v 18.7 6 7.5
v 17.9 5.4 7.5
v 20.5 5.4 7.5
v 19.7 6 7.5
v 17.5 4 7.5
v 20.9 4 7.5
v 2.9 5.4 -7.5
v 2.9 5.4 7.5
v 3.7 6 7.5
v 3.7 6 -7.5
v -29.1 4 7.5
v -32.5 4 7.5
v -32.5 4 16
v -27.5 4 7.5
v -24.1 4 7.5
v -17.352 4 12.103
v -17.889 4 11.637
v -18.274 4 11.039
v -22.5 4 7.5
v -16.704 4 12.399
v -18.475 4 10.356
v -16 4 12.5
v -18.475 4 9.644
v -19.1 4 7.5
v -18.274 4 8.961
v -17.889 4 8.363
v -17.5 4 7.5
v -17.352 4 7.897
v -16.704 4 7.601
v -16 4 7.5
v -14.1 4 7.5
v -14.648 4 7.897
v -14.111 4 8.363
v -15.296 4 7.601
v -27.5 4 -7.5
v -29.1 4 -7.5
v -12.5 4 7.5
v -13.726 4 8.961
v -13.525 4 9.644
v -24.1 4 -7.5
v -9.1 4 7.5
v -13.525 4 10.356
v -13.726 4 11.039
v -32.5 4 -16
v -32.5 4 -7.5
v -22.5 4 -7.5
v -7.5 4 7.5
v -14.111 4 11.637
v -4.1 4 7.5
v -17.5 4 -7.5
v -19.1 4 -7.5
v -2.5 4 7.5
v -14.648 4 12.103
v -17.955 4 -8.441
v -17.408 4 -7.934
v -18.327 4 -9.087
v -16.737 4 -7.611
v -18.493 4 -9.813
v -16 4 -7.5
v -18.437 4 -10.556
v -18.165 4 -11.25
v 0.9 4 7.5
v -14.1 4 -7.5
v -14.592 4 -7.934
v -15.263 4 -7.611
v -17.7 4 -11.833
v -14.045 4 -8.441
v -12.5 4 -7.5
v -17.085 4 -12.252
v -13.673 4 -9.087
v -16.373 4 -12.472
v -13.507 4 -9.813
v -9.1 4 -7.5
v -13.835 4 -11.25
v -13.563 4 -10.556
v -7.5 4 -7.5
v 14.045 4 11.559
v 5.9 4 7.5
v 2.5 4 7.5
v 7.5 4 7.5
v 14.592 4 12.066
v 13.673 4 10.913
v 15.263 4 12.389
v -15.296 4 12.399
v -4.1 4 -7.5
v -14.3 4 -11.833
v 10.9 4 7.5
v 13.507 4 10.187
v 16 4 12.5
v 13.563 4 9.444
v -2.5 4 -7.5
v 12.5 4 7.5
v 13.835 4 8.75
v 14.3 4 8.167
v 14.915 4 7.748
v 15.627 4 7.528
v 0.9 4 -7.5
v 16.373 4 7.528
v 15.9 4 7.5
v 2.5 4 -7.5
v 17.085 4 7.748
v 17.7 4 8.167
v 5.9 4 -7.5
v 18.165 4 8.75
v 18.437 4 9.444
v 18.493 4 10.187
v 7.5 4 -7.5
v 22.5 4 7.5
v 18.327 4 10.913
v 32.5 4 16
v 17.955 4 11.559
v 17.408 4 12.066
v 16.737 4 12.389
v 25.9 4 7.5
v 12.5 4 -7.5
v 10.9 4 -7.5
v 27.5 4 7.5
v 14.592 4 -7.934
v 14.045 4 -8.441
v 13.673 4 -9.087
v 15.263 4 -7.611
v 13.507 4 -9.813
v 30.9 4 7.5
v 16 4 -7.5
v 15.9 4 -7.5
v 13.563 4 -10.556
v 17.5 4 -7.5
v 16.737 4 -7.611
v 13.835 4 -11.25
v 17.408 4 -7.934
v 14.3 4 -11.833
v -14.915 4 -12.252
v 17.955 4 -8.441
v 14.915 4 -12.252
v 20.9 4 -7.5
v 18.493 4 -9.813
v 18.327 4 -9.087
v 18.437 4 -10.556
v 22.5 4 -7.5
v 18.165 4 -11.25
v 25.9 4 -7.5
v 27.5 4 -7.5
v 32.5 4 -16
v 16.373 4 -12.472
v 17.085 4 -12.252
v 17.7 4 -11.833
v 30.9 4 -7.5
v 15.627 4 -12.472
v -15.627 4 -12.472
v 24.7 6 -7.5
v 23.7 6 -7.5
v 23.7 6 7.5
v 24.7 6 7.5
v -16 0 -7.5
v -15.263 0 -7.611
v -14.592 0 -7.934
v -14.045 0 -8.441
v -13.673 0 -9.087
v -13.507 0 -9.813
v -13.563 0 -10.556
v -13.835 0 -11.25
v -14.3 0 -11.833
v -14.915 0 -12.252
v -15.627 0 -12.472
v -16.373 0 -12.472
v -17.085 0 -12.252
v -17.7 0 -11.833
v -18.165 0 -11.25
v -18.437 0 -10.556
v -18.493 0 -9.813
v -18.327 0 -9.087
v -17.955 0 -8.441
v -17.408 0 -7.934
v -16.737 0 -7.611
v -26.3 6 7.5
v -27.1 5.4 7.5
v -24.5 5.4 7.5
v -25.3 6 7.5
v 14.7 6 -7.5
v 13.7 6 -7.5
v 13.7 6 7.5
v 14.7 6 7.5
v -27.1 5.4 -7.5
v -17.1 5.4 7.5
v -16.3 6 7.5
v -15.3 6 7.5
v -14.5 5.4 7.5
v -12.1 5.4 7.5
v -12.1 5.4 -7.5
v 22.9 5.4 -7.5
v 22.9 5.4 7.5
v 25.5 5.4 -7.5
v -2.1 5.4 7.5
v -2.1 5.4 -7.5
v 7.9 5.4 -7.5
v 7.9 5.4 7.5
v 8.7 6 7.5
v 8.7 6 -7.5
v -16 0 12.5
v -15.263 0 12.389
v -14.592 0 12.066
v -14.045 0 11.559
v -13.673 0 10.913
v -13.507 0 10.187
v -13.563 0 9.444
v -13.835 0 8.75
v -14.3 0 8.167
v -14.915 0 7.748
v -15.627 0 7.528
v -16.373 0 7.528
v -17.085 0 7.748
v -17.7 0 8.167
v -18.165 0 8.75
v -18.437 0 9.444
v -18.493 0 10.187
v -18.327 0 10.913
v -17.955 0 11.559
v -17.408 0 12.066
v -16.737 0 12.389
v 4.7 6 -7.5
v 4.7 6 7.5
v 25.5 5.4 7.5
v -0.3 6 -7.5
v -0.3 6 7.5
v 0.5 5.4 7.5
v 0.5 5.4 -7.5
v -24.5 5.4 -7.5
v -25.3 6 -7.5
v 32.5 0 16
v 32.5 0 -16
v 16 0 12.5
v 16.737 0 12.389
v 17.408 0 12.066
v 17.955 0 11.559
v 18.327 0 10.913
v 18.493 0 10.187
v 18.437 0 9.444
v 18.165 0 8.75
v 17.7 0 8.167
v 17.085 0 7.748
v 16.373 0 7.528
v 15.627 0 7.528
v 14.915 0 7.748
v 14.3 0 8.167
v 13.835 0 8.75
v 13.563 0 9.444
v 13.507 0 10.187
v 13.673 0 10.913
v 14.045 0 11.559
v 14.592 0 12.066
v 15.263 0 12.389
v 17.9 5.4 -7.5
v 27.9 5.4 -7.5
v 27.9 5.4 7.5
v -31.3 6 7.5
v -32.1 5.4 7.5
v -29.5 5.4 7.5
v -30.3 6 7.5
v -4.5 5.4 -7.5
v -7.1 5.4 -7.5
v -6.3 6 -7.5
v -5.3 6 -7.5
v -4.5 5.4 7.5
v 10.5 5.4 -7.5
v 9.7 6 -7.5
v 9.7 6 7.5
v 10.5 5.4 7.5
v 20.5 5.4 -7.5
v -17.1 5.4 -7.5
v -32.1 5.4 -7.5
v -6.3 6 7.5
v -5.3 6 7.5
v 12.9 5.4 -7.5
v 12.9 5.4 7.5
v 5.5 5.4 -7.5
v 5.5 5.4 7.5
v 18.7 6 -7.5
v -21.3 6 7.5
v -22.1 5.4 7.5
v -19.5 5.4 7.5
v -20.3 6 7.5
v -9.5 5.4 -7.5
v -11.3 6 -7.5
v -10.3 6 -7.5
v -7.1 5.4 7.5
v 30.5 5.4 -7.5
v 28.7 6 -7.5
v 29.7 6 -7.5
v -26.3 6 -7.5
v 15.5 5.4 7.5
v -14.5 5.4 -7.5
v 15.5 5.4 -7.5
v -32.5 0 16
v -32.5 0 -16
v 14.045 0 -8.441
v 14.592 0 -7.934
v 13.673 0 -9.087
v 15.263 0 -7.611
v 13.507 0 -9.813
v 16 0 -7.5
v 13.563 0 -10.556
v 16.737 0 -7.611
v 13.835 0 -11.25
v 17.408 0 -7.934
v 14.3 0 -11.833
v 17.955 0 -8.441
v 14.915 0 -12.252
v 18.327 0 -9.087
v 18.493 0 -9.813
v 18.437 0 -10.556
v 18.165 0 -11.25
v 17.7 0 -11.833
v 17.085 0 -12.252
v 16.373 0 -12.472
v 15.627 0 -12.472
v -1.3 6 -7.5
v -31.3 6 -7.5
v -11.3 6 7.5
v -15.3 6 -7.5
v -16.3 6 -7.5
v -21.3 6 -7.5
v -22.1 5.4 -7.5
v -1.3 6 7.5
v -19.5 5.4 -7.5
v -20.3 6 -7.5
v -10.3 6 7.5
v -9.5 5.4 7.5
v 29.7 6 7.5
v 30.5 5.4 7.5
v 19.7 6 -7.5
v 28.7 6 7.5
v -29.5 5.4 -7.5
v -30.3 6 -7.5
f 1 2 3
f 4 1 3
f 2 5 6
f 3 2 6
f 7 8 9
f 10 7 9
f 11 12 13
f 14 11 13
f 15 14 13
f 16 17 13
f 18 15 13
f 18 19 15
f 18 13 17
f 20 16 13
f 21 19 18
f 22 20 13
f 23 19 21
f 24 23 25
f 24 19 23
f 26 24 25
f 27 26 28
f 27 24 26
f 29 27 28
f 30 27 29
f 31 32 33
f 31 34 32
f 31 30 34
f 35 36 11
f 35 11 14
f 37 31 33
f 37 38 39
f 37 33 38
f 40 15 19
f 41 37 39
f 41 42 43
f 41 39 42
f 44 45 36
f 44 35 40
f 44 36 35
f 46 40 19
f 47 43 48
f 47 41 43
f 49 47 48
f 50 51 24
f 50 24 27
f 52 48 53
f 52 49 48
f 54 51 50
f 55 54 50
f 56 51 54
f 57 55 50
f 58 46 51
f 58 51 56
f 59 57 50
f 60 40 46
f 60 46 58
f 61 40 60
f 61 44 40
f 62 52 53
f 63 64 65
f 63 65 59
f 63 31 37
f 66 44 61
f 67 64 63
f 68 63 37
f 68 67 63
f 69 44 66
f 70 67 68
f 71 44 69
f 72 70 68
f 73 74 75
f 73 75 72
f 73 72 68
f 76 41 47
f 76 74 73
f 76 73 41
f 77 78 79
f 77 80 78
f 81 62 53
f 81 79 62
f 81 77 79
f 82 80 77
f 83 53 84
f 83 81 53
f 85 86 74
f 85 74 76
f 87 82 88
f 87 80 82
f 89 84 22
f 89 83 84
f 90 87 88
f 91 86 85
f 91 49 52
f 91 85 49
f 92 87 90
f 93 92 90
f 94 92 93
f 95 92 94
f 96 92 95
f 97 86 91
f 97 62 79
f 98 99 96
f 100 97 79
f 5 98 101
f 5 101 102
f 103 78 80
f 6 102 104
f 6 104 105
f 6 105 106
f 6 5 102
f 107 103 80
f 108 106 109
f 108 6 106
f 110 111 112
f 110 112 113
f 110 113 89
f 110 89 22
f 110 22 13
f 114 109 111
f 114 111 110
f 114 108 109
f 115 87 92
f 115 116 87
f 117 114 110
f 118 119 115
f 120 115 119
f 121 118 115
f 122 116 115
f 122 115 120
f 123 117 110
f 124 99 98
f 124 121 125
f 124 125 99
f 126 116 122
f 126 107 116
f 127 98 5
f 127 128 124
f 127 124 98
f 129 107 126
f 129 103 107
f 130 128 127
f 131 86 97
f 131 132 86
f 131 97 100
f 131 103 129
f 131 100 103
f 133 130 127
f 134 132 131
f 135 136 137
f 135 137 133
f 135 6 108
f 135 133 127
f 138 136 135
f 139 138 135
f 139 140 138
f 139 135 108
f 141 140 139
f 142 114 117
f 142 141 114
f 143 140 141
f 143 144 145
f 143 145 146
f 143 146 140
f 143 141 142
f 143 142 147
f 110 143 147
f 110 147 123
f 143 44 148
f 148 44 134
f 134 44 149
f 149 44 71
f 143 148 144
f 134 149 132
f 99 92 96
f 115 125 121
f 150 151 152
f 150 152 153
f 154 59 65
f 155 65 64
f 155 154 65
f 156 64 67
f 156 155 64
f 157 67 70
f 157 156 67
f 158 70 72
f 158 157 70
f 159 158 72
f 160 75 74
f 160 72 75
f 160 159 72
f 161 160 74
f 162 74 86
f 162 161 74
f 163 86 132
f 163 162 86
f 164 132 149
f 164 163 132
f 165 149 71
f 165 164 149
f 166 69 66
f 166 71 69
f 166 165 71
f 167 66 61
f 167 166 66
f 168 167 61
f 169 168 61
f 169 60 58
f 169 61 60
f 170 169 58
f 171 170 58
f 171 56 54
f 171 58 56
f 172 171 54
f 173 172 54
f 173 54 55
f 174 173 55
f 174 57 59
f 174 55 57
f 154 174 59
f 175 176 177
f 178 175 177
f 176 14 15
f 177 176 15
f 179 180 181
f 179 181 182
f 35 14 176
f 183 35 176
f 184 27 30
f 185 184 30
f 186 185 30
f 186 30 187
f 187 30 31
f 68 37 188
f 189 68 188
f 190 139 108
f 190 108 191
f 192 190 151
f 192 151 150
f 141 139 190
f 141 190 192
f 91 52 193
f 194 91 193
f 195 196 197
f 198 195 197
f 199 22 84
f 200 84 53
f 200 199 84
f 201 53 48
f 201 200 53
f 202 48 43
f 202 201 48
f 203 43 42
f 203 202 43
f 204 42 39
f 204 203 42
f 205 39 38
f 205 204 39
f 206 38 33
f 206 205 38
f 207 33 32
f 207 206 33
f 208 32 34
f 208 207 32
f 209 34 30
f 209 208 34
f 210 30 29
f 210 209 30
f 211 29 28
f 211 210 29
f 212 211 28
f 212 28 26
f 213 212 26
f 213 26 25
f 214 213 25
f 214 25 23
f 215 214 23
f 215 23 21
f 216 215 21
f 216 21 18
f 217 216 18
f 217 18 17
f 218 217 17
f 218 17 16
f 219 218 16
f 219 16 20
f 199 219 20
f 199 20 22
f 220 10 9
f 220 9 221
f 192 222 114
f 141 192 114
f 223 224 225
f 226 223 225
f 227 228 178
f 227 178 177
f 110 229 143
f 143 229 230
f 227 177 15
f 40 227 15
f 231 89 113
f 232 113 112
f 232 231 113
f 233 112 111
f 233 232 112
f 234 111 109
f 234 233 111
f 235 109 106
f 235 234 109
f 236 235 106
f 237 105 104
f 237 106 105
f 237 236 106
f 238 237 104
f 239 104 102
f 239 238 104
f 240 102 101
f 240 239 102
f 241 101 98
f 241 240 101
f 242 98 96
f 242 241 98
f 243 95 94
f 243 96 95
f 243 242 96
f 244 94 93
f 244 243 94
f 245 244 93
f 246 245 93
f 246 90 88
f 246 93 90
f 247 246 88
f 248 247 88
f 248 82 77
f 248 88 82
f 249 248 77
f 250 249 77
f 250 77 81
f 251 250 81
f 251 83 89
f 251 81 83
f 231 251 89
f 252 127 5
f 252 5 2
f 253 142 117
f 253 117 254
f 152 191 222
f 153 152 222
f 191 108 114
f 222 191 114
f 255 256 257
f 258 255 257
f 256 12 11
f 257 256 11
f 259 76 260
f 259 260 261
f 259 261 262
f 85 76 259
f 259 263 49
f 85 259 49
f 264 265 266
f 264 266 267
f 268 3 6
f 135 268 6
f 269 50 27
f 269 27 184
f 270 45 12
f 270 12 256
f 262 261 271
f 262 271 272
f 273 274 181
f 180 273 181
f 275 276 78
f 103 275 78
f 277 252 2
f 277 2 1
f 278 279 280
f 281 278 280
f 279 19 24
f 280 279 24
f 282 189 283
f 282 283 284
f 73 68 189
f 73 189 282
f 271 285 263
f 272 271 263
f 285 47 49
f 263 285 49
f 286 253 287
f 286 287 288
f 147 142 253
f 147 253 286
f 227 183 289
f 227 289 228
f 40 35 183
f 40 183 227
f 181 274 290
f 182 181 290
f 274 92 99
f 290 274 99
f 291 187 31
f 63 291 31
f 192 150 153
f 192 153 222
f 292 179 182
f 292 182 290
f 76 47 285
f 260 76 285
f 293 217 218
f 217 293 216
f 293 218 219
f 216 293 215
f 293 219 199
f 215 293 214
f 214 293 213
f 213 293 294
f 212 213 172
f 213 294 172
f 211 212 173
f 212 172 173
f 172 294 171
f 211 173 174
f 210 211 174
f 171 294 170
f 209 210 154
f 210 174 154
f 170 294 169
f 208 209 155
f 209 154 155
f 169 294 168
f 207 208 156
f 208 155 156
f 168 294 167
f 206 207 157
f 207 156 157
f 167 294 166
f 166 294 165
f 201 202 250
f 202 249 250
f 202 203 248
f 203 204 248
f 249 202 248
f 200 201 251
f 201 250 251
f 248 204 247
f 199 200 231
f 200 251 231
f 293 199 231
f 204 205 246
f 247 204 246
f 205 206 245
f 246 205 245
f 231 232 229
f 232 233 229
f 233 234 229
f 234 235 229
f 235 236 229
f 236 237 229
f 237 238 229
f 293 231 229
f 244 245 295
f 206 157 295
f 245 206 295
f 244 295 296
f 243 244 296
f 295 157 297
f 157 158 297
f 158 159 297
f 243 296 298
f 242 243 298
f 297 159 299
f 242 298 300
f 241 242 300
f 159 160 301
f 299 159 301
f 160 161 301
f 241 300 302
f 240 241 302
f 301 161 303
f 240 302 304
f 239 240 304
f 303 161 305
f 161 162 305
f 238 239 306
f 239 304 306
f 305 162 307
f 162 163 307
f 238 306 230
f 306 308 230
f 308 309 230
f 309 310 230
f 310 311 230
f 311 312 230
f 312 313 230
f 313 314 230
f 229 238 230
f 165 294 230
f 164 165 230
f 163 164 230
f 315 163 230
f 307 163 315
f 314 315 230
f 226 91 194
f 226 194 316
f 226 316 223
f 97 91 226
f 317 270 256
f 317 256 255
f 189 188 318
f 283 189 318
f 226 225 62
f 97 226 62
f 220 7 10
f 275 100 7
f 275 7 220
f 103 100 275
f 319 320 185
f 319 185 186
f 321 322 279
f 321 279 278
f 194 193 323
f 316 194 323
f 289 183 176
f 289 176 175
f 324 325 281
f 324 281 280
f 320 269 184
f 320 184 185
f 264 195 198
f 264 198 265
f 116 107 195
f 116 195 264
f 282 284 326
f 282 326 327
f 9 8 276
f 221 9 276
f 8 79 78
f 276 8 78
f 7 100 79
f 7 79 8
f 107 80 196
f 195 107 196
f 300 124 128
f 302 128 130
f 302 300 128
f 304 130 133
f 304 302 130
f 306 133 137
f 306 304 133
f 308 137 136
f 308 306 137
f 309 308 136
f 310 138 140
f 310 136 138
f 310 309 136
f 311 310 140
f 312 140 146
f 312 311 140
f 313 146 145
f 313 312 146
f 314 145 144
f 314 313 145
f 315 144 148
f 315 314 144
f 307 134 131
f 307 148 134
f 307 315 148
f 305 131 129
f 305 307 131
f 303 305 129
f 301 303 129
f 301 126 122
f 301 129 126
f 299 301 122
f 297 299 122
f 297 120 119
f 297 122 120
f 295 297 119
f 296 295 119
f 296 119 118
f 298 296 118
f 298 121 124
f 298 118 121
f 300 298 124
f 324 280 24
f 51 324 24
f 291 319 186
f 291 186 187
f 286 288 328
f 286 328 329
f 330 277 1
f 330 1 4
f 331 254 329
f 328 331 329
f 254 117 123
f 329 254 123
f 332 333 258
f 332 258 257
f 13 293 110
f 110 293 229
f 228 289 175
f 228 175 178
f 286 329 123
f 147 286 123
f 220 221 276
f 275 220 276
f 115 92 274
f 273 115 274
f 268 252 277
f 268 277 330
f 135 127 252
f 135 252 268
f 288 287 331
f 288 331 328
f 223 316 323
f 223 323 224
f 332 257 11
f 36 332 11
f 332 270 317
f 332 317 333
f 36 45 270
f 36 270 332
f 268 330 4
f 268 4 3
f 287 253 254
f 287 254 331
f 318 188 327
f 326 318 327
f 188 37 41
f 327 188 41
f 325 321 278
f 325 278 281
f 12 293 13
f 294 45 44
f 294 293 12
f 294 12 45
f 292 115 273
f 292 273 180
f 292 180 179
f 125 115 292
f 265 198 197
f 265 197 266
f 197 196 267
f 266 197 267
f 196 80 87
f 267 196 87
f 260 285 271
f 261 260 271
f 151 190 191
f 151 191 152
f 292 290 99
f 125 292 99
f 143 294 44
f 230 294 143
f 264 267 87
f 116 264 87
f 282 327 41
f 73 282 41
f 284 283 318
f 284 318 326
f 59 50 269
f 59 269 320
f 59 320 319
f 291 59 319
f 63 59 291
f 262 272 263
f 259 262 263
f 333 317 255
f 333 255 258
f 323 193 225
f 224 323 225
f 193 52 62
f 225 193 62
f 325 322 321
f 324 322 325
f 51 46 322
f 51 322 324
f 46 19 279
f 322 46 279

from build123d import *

# Parameters (mm, degrees)
SKETCH1_W           = 65
SKETCH1_H           = 32
SKETCH1_R           = 2.5
BOSS_EXTRUDE1_DEPTH = 4
SKETCH2_W           = 65
SKETCH2_H           = 15
BOSS_EXTRUDE2_DEPTH = 2
CUT_EXTRUDE2_DEPTH  = 41.552435192


with BuildPart() as part:
    # Sketch1 → Boss-Extrude1 (new body)
    with BuildSketch(Plane(origin=(0, 0, 0), x_dir=(1, 0, 0), z_dir=(0, 1, 0))):
        Rectangle(SKETCH1_W, SKETCH1_H)
        with Locations((-16, 10)):
            Circle(SKETCH1_R, mode=Mode.SUBTRACT)
        with Locations((16, 10)):
            Circle(SKETCH1_R, mode=Mode.SUBTRACT)
        with Locations((-16, -10)):
            Circle(SKETCH1_R, mode=Mode.SUBTRACT)
        with Locations((16, -10)):
            Circle(SKETCH1_R, mode=Mode.SUBTRACT)
    extrude(amount=BOSS_EXTRUDE1_DEPTH)

    # Sketch2 → Boss-Extrude2 (add)
    with BuildSketch(Plane(origin=(0, 4, 0), x_dir=(1, 0, 0), z_dir=(0, 1, 0))):
        Rectangle(SKETCH2_W, SKETCH2_H)
    extrude(amount=BOSS_EXTRUDE2_DEPTH)

    # Sketch3 → Cut-Extrude2 (cut, through all)
    with BuildSketch(Plane.XY.offset(7.5)):
        Polygon((-32.5, 6), (-32.5, 4), (-32.1, 5.4), (-31.3, 6), align=None)
        Polygon((-29.5, 5.4), (-29.1, 4), (-27.5, 4), (-27.1, 5.4), (-26.3, 6), (-30.3, 6), align=None)
        Polygon((-24.5, 5.4), (-24.1, 4), (-22.5, 4), (-22.1, 5.4), (-21.3, 6), (-24.1, 6), (-25.3, 6), align=None)
        Polygon((-19.5, 5.4), (-19.1, 4), (-17.5, 4), (-17.1, 5.4), (-16.3, 6), (-20.3, 6), align=None)
        Polygon((-14.5, 5.4), (-14.1, 4), (-12.5, 4), (-12.1, 5.4), (-11.3, 6), (-15.3, 6), align=None)
        Polygon((-9.5, 5.4), (-9.1, 4), (-7.5, 4), (-7.1, 5.4), (-6.3, 6), (-10.3, 6), align=None)
        Polygon((-4.5, 5.4), (-4.1, 4), (-2.5, 4), (-2.1, 5.4), (-1.3, 6), (-5.3, 6), align=None)
        Polygon((0.5, 5.4), (0.9, 4), (2.5, 4), (2.9, 5.4), (3.7, 6), (-0.3, 6), align=None)
        Polygon((5.5, 5.4), (5.9, 4), (7.5, 4), (7.9, 5.4), (8.7, 6), (4.7, 6), align=None)
        Polygon((10.5, 5.4), (10.9, 4), (12.5, 4), (12.9, 5.4), (13.7, 6), (9.7, 6), align=None)
        Polygon((15.5, 5.4), (15.9, 4), (17.5, 4), (17.9, 5.4), (18.7, 6), (14.7, 6), align=None)
        Polygon((20.5, 5.4), (20.9, 4), (22.5, 4), (22.9, 5.4), (23.7, 6), (19.7, 6), align=None)
        Polygon((25.5, 5.4), (25.9, 4), (27.5, 4), (27.9, 5.4), (28.7, 6), (24.7, 6), align=None)
        Polygon((30.5, 5.4), (30.9, 4), (32.5, 4), (32.5, 6), (29.7, 6), align=None)
    extrude(amount=-CUT_EXTRUDE2_DEPTH, mode=Mode.SUBTRACT)


solid = part.part
